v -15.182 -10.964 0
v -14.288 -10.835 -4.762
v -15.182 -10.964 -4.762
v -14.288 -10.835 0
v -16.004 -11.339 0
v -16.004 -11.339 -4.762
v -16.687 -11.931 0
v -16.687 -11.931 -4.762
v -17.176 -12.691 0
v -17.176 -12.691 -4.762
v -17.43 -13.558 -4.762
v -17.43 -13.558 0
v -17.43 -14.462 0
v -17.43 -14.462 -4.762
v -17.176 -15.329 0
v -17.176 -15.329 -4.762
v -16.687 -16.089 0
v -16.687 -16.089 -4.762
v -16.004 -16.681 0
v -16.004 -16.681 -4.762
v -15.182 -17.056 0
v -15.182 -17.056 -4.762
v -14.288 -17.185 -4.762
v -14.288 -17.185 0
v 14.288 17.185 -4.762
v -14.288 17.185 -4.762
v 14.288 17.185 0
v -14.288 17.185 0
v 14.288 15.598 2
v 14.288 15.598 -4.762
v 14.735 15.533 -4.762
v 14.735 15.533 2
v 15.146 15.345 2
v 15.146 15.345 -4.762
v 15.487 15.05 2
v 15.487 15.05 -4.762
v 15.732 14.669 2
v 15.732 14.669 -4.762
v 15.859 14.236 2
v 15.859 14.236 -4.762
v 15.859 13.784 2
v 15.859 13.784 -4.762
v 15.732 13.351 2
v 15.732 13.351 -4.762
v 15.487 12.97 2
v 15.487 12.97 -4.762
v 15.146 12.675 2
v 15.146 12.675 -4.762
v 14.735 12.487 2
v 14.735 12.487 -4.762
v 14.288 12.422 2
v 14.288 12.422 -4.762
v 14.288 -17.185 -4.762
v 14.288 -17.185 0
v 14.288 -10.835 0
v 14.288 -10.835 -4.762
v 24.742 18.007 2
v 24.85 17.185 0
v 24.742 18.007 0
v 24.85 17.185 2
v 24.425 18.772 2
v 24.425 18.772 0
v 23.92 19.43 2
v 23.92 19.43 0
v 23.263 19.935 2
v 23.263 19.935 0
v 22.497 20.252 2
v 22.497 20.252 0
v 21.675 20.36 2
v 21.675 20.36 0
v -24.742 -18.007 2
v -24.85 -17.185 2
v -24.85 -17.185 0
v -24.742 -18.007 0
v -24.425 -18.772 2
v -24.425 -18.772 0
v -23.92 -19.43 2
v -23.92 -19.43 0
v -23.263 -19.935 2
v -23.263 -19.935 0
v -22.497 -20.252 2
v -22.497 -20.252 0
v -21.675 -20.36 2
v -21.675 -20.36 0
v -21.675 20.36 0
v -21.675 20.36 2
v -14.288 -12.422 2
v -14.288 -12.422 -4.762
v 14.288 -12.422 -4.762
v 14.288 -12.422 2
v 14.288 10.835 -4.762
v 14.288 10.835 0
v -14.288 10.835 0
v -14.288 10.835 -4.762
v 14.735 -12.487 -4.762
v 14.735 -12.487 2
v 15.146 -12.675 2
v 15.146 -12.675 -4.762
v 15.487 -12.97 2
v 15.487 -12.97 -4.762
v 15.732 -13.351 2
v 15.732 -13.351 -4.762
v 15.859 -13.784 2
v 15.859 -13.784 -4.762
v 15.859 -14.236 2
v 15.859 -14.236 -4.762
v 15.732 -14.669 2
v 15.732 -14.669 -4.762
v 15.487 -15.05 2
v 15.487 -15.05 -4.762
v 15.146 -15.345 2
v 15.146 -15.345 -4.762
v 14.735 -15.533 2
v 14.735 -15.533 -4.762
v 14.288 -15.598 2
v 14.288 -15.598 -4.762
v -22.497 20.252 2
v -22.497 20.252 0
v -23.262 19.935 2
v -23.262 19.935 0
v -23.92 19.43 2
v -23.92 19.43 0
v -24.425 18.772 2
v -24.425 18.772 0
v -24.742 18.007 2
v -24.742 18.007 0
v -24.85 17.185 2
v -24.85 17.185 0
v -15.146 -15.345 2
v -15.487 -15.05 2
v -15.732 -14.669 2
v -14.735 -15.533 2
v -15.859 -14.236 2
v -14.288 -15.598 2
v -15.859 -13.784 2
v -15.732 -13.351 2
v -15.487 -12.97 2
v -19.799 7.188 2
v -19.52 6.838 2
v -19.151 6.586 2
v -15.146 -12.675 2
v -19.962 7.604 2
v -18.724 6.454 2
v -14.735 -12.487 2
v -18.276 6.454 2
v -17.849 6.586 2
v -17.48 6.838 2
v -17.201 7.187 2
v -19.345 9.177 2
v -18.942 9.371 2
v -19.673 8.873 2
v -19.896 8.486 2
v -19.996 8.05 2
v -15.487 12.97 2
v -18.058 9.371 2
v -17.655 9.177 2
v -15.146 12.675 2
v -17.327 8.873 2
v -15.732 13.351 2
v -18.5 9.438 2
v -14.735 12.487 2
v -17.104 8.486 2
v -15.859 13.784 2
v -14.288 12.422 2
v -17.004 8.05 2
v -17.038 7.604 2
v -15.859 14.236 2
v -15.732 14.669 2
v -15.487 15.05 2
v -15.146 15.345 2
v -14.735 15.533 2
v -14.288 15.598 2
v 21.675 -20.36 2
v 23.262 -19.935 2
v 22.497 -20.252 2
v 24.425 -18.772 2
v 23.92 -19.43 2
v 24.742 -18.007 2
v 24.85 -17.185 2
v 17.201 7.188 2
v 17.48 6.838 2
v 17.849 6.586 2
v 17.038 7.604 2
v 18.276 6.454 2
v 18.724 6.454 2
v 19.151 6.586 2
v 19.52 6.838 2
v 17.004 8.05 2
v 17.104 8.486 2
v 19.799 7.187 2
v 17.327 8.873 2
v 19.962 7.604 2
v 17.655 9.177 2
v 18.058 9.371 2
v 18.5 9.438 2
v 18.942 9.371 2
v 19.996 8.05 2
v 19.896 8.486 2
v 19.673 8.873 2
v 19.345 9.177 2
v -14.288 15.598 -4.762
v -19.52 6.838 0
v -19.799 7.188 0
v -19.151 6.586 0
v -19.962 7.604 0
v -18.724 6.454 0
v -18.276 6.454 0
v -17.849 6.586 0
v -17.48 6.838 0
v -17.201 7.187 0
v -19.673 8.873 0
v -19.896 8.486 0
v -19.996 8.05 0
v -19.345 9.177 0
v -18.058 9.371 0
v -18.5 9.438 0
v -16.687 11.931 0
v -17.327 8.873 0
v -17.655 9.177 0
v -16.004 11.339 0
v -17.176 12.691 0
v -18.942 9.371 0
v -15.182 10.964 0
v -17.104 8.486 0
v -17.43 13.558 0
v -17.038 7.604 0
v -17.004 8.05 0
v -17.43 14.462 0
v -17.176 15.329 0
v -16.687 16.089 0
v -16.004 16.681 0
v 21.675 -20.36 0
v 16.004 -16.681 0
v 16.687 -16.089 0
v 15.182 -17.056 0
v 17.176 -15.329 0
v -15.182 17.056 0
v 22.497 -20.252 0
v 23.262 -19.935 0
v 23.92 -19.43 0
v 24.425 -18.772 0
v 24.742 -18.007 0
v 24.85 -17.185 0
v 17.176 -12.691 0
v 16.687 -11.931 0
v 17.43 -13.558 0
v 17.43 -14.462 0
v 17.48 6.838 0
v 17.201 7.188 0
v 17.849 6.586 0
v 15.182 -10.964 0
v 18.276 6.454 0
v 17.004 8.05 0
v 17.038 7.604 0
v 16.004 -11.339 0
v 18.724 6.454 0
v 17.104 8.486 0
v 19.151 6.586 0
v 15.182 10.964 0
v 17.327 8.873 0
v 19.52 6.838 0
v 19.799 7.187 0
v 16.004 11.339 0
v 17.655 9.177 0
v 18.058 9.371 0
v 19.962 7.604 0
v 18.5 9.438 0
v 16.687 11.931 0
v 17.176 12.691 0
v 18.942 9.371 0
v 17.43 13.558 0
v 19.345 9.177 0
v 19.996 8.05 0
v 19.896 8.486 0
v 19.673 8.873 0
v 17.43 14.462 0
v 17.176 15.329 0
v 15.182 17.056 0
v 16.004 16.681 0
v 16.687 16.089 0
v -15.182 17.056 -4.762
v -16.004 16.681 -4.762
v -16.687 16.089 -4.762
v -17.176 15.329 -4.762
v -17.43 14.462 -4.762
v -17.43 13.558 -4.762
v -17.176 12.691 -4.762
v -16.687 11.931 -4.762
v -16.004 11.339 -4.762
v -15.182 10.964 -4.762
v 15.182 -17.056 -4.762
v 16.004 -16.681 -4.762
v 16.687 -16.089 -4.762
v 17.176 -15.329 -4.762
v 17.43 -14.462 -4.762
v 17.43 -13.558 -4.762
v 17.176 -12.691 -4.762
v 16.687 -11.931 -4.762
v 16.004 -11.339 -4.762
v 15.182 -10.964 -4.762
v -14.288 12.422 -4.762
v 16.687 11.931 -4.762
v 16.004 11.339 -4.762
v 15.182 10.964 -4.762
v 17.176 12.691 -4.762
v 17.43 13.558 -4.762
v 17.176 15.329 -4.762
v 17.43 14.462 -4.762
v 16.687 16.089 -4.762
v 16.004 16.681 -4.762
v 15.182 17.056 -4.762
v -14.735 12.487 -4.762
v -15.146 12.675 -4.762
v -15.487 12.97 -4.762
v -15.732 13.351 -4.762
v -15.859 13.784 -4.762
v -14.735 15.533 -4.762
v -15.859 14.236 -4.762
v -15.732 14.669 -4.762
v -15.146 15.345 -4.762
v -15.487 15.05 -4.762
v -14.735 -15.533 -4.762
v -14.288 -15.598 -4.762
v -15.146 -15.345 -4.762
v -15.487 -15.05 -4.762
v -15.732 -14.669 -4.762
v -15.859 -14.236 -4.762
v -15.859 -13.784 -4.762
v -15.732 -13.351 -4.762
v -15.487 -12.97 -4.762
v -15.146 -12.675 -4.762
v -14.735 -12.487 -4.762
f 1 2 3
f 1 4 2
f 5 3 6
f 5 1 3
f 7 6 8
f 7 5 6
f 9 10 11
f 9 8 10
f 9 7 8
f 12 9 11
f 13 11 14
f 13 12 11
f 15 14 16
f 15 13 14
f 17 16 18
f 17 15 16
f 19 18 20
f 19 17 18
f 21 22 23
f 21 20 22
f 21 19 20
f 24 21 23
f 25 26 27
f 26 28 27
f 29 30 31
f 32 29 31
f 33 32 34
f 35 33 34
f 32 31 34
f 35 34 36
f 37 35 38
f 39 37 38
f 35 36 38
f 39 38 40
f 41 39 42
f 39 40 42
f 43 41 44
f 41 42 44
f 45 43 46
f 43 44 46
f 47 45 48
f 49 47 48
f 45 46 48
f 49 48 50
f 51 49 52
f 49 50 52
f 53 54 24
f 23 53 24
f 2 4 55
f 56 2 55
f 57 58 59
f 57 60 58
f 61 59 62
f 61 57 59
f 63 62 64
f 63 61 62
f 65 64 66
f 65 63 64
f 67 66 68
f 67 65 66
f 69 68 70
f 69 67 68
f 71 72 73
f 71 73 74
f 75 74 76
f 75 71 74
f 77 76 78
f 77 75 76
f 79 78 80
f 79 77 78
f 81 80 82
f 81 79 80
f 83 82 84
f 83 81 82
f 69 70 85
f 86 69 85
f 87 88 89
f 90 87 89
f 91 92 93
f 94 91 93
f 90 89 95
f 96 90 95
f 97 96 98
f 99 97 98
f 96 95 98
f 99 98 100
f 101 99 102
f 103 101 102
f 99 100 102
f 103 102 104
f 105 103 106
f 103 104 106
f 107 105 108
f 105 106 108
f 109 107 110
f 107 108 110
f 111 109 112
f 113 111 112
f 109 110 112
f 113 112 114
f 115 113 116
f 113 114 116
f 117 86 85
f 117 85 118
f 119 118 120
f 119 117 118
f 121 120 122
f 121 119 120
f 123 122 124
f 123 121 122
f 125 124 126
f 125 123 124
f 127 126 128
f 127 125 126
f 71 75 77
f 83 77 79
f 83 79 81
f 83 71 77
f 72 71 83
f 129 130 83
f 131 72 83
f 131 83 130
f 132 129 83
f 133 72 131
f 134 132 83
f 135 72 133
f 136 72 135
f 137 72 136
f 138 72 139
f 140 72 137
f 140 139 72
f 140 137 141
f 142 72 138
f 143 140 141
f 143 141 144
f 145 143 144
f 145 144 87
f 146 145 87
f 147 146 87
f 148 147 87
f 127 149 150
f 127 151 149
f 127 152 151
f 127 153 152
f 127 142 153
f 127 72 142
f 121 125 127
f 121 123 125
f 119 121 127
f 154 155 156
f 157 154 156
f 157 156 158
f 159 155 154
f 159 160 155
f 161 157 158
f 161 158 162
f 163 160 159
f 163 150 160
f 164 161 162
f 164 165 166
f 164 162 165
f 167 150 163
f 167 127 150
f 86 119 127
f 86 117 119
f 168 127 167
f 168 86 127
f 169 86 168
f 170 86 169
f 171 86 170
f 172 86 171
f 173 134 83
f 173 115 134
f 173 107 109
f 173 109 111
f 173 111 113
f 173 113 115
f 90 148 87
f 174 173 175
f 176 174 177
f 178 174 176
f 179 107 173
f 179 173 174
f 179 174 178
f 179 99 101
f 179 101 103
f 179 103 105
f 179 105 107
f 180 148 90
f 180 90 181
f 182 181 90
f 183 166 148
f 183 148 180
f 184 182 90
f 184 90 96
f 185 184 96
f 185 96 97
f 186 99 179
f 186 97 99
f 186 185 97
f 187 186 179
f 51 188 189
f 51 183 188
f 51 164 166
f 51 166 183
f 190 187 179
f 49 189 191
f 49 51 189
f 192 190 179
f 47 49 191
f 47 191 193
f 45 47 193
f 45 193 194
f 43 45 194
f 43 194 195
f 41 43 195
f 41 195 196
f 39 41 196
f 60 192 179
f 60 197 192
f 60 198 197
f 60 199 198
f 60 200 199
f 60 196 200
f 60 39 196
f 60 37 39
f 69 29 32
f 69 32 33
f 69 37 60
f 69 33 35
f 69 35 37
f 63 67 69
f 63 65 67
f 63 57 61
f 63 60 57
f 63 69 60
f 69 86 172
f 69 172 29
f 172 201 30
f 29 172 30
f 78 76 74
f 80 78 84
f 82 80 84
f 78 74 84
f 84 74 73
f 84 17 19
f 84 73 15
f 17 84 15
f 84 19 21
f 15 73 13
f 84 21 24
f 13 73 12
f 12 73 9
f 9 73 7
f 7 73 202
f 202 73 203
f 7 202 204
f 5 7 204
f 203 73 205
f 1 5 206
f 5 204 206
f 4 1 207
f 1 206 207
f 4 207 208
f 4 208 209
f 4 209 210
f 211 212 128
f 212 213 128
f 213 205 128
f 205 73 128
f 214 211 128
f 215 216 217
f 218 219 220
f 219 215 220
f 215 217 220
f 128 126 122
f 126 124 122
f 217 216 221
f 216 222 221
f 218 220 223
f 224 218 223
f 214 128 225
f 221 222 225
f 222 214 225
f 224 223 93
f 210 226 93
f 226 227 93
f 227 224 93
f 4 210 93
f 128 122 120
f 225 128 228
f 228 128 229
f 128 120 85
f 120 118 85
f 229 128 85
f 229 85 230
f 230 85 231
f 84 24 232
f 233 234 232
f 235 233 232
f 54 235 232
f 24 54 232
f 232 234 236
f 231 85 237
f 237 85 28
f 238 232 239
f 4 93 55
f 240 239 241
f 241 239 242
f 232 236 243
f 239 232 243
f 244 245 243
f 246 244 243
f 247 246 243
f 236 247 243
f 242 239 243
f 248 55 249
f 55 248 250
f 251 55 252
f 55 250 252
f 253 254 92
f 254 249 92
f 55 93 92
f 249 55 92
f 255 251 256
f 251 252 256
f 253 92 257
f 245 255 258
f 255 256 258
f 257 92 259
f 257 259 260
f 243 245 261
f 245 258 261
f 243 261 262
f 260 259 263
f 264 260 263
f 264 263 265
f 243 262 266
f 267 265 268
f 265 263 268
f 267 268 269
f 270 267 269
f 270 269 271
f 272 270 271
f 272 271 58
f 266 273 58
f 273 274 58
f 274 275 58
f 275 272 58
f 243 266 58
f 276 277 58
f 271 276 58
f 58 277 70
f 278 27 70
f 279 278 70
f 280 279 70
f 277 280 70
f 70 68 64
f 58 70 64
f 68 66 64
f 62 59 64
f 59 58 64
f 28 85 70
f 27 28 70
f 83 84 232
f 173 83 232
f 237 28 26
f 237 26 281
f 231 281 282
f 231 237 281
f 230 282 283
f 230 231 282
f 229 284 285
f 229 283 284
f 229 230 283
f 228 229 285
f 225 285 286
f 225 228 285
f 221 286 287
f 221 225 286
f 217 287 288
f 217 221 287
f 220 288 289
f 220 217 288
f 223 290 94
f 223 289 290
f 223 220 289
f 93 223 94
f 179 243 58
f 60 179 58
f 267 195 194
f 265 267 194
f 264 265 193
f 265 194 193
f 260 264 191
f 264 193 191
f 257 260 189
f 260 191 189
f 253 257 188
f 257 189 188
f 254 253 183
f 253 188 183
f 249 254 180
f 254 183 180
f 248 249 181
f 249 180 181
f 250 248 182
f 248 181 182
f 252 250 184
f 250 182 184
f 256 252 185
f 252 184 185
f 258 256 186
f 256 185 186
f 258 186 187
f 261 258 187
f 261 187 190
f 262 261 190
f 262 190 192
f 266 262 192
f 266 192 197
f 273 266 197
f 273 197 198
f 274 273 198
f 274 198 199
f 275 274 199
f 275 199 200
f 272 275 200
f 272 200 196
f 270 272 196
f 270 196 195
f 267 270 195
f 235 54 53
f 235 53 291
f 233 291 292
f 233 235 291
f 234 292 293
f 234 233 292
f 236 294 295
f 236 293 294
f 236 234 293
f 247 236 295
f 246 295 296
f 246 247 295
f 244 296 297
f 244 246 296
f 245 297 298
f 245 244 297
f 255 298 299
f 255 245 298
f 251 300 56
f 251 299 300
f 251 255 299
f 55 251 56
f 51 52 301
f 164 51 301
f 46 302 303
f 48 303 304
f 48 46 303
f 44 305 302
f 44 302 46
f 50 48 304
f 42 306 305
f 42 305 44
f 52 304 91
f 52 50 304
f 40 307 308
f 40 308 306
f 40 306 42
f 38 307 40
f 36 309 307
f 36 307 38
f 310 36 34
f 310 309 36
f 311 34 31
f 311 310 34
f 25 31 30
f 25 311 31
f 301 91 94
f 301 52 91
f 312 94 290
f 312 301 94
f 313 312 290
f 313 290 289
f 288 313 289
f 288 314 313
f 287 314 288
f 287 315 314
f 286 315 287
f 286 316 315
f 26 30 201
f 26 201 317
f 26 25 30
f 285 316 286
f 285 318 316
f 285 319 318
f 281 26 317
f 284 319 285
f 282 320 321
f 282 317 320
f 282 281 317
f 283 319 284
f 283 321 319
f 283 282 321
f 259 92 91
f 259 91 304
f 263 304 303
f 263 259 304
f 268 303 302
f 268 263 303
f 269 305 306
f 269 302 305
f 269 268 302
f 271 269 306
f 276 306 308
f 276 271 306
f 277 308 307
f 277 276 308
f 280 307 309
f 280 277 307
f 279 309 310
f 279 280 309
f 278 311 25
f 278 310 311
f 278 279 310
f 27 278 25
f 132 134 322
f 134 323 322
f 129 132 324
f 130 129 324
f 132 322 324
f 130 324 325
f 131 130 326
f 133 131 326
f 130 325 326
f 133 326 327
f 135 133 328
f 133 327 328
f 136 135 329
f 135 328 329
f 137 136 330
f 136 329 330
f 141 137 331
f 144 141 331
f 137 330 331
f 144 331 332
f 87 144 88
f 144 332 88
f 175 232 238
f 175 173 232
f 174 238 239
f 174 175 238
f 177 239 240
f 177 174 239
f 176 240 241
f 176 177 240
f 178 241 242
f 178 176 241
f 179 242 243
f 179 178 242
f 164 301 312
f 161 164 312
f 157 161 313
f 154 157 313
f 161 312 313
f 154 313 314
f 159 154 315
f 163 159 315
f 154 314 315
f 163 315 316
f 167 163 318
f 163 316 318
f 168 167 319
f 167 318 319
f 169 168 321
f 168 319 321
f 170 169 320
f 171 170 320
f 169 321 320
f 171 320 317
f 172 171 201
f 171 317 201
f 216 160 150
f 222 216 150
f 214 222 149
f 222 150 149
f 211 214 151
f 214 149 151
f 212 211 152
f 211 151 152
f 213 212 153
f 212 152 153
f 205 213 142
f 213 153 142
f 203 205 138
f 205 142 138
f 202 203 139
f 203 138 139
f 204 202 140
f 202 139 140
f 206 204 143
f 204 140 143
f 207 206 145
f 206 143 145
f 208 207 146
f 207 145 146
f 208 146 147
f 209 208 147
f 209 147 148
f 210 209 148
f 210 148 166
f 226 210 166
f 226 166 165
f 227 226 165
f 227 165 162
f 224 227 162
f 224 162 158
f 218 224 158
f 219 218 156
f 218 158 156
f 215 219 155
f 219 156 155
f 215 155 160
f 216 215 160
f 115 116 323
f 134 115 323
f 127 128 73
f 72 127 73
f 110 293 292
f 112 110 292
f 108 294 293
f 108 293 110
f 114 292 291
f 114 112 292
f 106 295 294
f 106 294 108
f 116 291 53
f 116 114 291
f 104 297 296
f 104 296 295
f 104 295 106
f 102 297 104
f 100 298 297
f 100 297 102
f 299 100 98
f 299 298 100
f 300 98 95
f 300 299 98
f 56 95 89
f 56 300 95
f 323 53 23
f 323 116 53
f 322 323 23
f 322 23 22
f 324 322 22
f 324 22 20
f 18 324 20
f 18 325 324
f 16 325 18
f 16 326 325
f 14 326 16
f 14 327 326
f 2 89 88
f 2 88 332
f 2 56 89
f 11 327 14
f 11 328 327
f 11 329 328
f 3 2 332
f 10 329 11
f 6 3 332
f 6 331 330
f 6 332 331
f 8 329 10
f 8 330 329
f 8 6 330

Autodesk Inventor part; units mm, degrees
ref_plane "YZ Plane" through (0, 0, 0) normal (1, 0, 0) x (0, 1, 0)
ref_plane "XZ Plane" through (0, 0, 0) normal (0, 1, 0) x (-1, 0, 0)
ref_plane "XY Plane" through (0, 0, 0) normal (0, 0, 1) x (1, 0, 0)
sketch "Sketch1" plane through (0, 0, 0) normal (0, 0, 1) x (1, 0, 0)
  line L0 (-24.85, -20.36) -> (24.85, -20.36)
  line L1 (24.85, -20.36) -> (24.85, 20.36)
  line L2 (24.85, 20.36) -> (-24.85, 20.36)
  line L3 (-24.85, 20.36) -> (-24.85, -20.36)
  line L4 (-24.85, -20.36) -> (24.85, 20.36) construction
  line L5 (24.85, -20.36) -> (-24.85, 20.36) construction
  point P0 (0, 0)
  dimension "d0" = 49.7
  dimension "d1" = 40.72
extrude "Extrusion1" add sketch "Sketch1" along normal blind 2
sketch "Sketch3" plane through (0, 0, 0) normal (0, 0, -1) x (-1, 0, 0)
  line L0 (24.85, 20.36) -> (24.85, -20.36) projected
  line L1 (14.2875, -14.01) -> (-14.2875, -14.01) construction
  line L2 (14.2875, -10.835) -> (-14.2875, -10.835)
  line L3 (-14.2875, -17.185) -> (14.2875, -17.185)
  arc A0 (14.2875, -17.185) -> (14.2875, -10.835) centre (14.2875, -14.01) ccw
  arc A1 (-14.2875, -10.835) -> (-14.2875, -17.185) centre (-14.2875, -14.01) ccw
  line L4 (0, -28.504) -> (0, 28.504) projected
  line L5 (34.79, 0) -> (-34.79, 0) projected
  line L6 (14.2875, 14.01) -> (-14.2875, 14.01) construction
  line L7 (14.2875, 17.185) -> (-14.2875, 17.185)
  line L8 (-14.2875, 10.835) -> (14.2875, 10.835)
  arc A2 (14.2875, 10.835) -> (14.2875, 17.185) centre (14.2875, 14.01) ccw
  arc A3 (-14.2875, 17.185) -> (-14.2875, 10.835) centre (-14.2875, 14.01) ccw
  point P0 (0, 0)
  point P1 (0, -14.01)
  point P2 (0, 14.01)
  dimension "d28" = 3.175
  dimension "d29" = 28.02
  dimension "d30" = 28.575
sketch "Sketch5" plane through (0, 0, 0) normal (0, 0, -1) x (-1, 0, 0)
  line L0 (0, -28.504) -> (0, 28.504) projected
  line L1 (34.79, 0) -> (-34.79, 0) projected
  point P0 (0, 0)
  point P1 (-18.5, 7.9375)
  point P2 (18.5, 7.9375)
  dimension "d17" = 37
  dimension "d26" = 7.9375
hole "Hole1" at (18.5, 7.9375, 0) at (-18.5, 7.9375, 0) direction (0, 0, 1) diameter 3 depth 2
fillet "Fillet1" radius 3.175 4 edges at (24.85, -20.36, 1) (24.85, 20.36, 1) (-24.85, 20.36, 1) (-24.85, -20.36, 1)
extrude "Extrusion4" add sketch "Sketch3" along normal blind 4.7625
sketch "Sketch6" plane through (0, 0, -4.7625) normal (0, 0, -1) x (-1, 0, 0)
  line L0 (14.2875, -10.835) -> (-14.2875, -10.835) projected
  arc A0 (-14.2875, -10.835) -> (-14.2875, -17.185) centre (-14.2875, -14.01) ccw projected
  line L1 (-14.2875, -17.185) -> (14.2875, -17.185) projected
  arc A1 (14.2875, -17.185) -> (14.2875, -10.835) centre (14.2875, -14.01) ccw projected
  line L2 (14.2875, 17.185) -> (-14.2875, 17.185) projected
  arc A2 (-14.2875, 17.185) -> (-14.2875, 10.835) centre (-14.2875, 14.01) ccw projected
  line L3 (-14.2875, 10.835) -> (14.2875, 10.835) projected
  arc A3 (14.2875, 10.835) -> (14.2875, 17.185) centre (14.2875, 14.01) ccw projected
  line L4 (14.2875, -14.01) -> (-14.2875, -14.01) construction
  line L5 (14.2875, -12.4225) -> (-14.2875, -12.4225)
  line L6 (-14.2875, -15.5975) -> (14.2875, -15.5975)
  arc A4 (14.2875, -15.5975) -> (14.2875, -12.4225) centre (14.2875, -14.01) ccw
  arc A5 (-14.2875, -12.4225) -> (-14.2875, -15.5975) centre (-14.2875, -14.01) ccw
  line L7 (14.2875, 14.01) -> (-14.2875, 14.01) construction
  line L8 (14.2875, 15.5975) -> (-14.2875, 15.5975)
  line L9 (-14.2875, 12.4225) -> (14.2875, 12.4225)
  arc A6 (14.2875, 12.4225) -> (14.2875, 15.5975) centre (14.2875, 14.01) ccw
  arc A7 (-14.2875, 15.5975) -> (-14.2875, 12.4225) centre (-14.2875, 14.01) ccw
  point P0 (0, 0)
  point P1 (0, -14.01)
  point P2 (0, 14.01)
  dimension "d33" = 1.5875
extrude "Extrusion5" cut sketch "Sketch6" along normal through all both and the other way through all contours A4 L6 A5 L5 | A6 L9 A7 L8
properties part number "RC_CAR_ARDUINO_PLATE"
